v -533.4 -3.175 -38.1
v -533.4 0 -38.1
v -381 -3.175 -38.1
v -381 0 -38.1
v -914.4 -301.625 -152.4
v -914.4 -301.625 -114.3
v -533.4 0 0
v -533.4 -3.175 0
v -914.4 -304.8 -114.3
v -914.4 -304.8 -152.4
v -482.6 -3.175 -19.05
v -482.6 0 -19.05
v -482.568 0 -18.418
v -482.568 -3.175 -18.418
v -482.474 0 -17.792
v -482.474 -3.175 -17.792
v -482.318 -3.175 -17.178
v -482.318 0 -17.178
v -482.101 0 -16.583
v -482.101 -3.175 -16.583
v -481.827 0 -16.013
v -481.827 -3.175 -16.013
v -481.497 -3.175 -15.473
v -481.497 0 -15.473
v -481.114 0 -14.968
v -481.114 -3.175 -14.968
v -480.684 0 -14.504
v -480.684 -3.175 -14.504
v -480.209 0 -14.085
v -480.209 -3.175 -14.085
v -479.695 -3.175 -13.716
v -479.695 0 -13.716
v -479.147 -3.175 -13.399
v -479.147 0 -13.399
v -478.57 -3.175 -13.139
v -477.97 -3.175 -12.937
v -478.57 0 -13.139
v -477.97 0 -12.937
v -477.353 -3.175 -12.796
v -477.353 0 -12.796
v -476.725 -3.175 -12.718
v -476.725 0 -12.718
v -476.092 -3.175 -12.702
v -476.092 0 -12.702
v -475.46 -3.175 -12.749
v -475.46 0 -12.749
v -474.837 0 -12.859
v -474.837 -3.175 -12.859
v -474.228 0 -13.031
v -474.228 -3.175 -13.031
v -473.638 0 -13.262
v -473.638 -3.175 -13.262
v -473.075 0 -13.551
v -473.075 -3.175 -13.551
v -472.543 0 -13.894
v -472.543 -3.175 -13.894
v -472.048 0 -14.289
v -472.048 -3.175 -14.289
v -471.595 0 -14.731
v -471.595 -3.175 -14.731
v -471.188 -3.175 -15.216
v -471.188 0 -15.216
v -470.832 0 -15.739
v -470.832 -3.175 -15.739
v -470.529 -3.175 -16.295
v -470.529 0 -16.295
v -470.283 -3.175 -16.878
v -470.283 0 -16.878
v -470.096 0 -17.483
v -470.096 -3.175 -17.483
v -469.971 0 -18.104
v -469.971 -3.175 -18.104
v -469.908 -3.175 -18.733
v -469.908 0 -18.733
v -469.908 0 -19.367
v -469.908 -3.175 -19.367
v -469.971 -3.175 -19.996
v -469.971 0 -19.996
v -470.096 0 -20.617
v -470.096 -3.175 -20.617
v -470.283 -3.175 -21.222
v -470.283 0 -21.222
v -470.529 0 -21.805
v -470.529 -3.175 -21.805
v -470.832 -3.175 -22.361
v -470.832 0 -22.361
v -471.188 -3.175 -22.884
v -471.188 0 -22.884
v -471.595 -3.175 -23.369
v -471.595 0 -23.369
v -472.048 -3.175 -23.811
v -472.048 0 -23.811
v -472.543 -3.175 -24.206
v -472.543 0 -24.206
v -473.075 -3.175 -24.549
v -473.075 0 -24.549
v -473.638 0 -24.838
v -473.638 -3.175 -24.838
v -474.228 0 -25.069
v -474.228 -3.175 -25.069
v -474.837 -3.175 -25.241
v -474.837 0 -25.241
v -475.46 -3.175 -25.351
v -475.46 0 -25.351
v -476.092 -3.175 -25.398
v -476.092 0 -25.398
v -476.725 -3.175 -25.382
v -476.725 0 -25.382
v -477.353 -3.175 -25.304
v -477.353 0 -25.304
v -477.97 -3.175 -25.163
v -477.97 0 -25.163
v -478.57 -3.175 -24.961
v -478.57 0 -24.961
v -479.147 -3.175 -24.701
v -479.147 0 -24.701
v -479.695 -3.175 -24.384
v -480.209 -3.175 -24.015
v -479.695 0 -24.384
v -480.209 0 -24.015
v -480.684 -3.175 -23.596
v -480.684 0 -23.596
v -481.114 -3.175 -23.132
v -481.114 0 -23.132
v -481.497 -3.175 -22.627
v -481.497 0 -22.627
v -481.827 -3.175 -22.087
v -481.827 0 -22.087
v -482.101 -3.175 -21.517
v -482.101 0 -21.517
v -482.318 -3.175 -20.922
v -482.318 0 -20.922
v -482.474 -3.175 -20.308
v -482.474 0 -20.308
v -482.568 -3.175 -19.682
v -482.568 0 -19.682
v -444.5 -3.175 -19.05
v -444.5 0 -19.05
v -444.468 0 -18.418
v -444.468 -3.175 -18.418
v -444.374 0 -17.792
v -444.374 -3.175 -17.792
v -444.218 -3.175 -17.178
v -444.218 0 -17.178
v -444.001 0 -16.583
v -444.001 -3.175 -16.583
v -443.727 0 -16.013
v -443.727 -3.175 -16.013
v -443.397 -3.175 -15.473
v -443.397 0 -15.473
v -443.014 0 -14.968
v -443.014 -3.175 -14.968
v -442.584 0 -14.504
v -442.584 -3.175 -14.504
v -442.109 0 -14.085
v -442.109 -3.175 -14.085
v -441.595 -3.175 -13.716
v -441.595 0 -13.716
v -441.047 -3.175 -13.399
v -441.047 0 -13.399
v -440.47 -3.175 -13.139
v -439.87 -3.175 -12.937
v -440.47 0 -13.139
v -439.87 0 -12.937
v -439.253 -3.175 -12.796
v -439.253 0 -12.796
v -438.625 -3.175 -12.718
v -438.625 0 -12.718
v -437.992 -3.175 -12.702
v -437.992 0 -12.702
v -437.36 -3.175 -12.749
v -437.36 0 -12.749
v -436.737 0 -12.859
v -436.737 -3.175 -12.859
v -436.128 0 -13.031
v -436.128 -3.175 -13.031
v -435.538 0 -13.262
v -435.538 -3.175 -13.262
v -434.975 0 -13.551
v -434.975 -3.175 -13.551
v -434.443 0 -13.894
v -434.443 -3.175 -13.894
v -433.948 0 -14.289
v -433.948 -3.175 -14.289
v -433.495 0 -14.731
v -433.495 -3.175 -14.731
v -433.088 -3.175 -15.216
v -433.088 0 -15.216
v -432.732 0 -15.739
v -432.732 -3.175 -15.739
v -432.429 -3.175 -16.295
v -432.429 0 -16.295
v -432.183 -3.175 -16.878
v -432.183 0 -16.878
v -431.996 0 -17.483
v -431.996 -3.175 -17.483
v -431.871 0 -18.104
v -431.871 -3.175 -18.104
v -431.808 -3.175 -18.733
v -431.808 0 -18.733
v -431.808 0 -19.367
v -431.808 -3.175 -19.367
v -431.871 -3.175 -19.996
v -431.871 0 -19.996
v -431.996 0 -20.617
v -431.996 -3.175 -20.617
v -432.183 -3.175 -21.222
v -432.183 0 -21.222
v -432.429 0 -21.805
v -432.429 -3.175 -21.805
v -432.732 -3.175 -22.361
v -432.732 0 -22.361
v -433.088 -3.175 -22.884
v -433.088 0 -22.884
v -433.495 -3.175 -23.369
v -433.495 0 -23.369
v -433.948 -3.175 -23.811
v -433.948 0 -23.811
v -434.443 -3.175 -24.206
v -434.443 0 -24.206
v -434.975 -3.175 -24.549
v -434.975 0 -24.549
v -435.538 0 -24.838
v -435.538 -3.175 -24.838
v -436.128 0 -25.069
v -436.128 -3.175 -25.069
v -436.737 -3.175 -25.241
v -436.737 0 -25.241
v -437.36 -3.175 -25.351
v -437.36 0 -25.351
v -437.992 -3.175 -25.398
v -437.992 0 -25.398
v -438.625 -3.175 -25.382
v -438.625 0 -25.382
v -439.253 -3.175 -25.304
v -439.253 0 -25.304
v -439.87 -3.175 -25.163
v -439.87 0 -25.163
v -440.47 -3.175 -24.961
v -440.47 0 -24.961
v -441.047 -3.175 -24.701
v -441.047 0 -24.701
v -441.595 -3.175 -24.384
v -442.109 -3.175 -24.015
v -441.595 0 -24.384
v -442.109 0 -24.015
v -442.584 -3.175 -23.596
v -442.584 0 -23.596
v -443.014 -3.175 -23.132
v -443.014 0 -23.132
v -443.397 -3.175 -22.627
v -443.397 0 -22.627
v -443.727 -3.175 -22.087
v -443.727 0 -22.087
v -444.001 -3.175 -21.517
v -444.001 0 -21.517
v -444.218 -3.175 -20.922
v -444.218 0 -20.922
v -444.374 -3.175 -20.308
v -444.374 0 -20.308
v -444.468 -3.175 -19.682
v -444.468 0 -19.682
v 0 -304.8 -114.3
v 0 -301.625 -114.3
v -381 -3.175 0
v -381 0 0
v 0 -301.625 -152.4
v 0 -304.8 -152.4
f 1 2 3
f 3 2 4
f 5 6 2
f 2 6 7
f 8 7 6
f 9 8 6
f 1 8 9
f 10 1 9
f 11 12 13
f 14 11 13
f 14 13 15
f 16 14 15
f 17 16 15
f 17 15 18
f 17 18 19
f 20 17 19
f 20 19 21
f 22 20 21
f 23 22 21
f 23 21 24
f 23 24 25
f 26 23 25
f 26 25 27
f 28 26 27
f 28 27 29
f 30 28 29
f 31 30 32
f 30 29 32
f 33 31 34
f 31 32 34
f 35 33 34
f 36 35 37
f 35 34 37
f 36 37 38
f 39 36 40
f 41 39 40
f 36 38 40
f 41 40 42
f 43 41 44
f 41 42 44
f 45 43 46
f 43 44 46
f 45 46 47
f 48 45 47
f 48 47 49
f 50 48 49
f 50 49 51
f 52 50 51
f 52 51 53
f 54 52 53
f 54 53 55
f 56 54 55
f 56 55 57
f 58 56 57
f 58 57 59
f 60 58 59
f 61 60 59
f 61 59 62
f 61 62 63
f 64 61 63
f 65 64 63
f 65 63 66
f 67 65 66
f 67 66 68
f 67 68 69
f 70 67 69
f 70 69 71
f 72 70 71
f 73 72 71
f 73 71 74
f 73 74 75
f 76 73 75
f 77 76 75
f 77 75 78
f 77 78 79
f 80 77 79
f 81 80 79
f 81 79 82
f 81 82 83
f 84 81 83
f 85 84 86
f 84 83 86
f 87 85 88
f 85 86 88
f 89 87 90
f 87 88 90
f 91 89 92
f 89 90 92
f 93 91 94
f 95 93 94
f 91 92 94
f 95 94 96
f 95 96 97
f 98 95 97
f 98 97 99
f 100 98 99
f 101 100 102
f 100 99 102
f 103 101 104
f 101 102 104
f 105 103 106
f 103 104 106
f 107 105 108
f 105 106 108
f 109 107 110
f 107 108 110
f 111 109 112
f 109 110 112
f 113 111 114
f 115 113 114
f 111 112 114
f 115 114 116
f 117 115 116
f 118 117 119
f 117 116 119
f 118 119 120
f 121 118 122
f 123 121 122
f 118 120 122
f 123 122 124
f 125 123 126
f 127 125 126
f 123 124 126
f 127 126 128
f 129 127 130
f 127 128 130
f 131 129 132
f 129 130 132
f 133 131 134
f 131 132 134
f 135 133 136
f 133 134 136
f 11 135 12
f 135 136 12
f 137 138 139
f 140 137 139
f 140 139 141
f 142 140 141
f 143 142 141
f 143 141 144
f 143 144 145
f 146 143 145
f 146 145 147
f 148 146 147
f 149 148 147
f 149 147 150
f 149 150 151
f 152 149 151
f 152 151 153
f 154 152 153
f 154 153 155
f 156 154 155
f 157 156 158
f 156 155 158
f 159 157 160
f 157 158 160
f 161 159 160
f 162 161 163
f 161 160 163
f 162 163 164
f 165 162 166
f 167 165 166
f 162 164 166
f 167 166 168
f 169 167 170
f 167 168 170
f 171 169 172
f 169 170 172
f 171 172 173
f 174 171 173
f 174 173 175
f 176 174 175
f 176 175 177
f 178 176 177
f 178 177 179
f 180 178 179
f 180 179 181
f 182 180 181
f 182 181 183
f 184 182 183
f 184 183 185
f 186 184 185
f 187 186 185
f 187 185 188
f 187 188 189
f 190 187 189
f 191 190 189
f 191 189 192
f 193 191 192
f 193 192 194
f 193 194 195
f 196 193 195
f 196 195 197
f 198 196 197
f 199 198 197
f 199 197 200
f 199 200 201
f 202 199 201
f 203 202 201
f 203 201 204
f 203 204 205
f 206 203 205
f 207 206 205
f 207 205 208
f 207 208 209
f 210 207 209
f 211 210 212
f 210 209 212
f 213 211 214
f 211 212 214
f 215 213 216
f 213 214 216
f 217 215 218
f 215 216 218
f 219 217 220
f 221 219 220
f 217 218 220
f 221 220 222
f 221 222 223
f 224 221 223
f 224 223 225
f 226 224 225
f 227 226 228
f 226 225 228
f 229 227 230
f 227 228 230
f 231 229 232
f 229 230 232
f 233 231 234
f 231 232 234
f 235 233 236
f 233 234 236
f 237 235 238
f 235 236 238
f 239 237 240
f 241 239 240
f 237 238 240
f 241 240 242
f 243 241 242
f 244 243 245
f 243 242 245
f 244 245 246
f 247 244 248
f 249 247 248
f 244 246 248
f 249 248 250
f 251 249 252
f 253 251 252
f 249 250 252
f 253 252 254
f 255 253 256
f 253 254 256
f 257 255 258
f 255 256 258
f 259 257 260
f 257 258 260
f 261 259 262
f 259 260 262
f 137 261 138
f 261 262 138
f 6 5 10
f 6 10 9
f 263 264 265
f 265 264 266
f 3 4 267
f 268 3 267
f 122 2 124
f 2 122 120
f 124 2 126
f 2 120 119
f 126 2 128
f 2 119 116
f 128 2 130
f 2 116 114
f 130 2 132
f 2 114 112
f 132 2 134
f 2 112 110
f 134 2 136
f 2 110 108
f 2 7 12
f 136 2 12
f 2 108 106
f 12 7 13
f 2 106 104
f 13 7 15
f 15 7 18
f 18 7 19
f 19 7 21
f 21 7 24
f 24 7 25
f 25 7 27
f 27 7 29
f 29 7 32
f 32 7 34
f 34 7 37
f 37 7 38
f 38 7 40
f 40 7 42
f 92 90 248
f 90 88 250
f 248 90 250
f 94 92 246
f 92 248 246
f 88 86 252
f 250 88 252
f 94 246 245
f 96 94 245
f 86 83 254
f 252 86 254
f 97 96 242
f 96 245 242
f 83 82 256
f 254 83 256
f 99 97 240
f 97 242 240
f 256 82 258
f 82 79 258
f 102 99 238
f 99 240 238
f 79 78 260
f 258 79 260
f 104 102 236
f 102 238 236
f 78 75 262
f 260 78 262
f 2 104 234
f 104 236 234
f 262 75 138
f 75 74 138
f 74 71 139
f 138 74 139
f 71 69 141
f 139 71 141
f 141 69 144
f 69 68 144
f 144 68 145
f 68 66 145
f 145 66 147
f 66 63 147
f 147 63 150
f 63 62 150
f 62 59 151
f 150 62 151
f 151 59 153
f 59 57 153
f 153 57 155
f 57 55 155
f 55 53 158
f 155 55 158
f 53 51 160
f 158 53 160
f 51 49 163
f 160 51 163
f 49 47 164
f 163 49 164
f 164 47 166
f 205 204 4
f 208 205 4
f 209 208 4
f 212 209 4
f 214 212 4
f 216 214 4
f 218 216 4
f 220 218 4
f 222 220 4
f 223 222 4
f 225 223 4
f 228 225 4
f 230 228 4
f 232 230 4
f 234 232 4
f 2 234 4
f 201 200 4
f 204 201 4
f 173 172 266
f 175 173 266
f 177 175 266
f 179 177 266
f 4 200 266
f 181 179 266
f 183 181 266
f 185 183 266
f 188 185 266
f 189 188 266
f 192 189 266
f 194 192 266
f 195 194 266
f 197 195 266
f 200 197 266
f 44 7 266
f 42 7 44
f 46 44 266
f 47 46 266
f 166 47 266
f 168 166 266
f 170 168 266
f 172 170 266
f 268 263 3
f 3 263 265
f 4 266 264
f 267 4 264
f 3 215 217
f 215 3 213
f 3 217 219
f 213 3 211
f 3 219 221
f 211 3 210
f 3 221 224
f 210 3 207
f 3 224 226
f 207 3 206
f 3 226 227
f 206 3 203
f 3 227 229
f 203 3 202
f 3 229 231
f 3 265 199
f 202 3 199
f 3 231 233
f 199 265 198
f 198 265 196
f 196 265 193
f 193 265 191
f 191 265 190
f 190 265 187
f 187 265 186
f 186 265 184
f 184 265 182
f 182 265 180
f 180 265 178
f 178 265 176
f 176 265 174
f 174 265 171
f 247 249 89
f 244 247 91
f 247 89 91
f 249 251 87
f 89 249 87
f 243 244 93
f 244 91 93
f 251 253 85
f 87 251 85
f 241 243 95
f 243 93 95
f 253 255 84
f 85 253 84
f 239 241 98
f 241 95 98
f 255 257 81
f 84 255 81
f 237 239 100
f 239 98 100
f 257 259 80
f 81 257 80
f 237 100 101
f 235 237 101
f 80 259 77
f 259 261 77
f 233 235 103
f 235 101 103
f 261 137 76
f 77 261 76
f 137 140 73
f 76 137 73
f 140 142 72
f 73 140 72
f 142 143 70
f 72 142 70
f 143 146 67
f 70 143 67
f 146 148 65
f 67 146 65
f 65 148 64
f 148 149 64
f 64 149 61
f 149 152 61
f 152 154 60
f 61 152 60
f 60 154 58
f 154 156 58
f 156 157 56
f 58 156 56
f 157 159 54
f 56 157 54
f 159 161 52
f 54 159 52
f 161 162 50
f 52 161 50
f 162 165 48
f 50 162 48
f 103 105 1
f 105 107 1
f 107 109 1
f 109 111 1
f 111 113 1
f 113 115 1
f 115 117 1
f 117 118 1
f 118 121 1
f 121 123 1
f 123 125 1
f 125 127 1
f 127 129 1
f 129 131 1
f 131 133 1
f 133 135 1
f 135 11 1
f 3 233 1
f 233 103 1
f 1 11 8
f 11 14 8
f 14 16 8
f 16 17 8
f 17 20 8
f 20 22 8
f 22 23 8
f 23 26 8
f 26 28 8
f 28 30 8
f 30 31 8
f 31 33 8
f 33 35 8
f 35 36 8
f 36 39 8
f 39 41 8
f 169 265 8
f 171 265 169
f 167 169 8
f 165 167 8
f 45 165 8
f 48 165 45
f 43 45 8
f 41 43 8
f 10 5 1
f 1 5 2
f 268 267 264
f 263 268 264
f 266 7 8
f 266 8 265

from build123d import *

# Parameters (mm, degrees)
F0_W      = 914.4
F0_H      = 152.4
F1_DEPTH  = 304.8
F3_DEPTH  = 152.401
F5_DEPTH  = 152.401
F7_DEPTH  = 152.401
F9_DEPTH  = 304.801
F11_DEPTH = 304.801
F13_DEPTH = 304.801
F15_D     = 12.7


with BuildPart() as f1:
    # F0 (on Front) → F1 (new body)
    with BuildSketch(Plane.XZ):
        with Locations((-457.2, -76.2)):
            Rectangle(F0_W, F0_H)
    extrude(amount=F1_DEPTH)

    # F2 (on face) → F3 (cut, through all)
    with BuildSketch(Plane.XY):
        Polygon((-381, -3.175), (-533.4, -3.175), (-914.4, -304.8), (0, -304.8), align=None)
    extrude(amount=-F3_DEPTH, mode=Mode.SUBTRACT)

    # F4 (on face) → F5 (cut, through all)
    with BuildSketch(Plane.XY):
        Polygon((-914.4, 0), (-914.4, -301.625), (-533.4, 0), align=None)
    extrude(amount=-F5_DEPTH, mode=Mode.SUBTRACT)

    # F6 (on face) → F7 (cut, through all)
    with BuildSketch(Plane.XY):
        Polygon((0, 0), (-381, 0), (0, -301.625), align=None)
    extrude(amount=-F7_DEPTH, mode=Mode.SUBTRACT)

    # F8 (on face) → F9 (cut, through all)
    with BuildSketch(Plane(origin=(0, 0, 0), x_dir=(-1, 0, 0), z_dir=(0, 1, 0))):
        Polygon((381, -38.1), (0, -152.4), (914.4, -152.4), (533.4, -38.1), align=None)
    extrude(amount=-F9_DEPTH, mode=Mode.SUBTRACT)

    # F10 (on face) → F11 (cut, through all)
    with BuildSketch(Plane(origin=(0, 0, 0), x_dir=(-1, 0, 0), z_dir=(0, 1, 0))):
        Polygon((0, -114.3), (381, 0), (0, 0), align=None)
    extrude(amount=-F11_DEPTH, mode=Mode.SUBTRACT)

    # F12 (on face) → F13 (cut, through all)
    with BuildSketch(Plane(origin=(0, 0, 0), x_dir=(-1, 0, 0), z_dir=(0, 1, 0))):
        Polygon((914.4, 0), (533.4, 0), (914.4, -114.3), align=None)
    extrude(amount=-F13_DEPTH, mode=Mode.SUBTRACT)

    # F15 (through all)
    with Locations(Plane.XZ.offset(3.175)):
        with Locations((-476.25, -19.05), (-438.15, -19.05)):
            Hole(F15_D / 2)


solid = f1.part
